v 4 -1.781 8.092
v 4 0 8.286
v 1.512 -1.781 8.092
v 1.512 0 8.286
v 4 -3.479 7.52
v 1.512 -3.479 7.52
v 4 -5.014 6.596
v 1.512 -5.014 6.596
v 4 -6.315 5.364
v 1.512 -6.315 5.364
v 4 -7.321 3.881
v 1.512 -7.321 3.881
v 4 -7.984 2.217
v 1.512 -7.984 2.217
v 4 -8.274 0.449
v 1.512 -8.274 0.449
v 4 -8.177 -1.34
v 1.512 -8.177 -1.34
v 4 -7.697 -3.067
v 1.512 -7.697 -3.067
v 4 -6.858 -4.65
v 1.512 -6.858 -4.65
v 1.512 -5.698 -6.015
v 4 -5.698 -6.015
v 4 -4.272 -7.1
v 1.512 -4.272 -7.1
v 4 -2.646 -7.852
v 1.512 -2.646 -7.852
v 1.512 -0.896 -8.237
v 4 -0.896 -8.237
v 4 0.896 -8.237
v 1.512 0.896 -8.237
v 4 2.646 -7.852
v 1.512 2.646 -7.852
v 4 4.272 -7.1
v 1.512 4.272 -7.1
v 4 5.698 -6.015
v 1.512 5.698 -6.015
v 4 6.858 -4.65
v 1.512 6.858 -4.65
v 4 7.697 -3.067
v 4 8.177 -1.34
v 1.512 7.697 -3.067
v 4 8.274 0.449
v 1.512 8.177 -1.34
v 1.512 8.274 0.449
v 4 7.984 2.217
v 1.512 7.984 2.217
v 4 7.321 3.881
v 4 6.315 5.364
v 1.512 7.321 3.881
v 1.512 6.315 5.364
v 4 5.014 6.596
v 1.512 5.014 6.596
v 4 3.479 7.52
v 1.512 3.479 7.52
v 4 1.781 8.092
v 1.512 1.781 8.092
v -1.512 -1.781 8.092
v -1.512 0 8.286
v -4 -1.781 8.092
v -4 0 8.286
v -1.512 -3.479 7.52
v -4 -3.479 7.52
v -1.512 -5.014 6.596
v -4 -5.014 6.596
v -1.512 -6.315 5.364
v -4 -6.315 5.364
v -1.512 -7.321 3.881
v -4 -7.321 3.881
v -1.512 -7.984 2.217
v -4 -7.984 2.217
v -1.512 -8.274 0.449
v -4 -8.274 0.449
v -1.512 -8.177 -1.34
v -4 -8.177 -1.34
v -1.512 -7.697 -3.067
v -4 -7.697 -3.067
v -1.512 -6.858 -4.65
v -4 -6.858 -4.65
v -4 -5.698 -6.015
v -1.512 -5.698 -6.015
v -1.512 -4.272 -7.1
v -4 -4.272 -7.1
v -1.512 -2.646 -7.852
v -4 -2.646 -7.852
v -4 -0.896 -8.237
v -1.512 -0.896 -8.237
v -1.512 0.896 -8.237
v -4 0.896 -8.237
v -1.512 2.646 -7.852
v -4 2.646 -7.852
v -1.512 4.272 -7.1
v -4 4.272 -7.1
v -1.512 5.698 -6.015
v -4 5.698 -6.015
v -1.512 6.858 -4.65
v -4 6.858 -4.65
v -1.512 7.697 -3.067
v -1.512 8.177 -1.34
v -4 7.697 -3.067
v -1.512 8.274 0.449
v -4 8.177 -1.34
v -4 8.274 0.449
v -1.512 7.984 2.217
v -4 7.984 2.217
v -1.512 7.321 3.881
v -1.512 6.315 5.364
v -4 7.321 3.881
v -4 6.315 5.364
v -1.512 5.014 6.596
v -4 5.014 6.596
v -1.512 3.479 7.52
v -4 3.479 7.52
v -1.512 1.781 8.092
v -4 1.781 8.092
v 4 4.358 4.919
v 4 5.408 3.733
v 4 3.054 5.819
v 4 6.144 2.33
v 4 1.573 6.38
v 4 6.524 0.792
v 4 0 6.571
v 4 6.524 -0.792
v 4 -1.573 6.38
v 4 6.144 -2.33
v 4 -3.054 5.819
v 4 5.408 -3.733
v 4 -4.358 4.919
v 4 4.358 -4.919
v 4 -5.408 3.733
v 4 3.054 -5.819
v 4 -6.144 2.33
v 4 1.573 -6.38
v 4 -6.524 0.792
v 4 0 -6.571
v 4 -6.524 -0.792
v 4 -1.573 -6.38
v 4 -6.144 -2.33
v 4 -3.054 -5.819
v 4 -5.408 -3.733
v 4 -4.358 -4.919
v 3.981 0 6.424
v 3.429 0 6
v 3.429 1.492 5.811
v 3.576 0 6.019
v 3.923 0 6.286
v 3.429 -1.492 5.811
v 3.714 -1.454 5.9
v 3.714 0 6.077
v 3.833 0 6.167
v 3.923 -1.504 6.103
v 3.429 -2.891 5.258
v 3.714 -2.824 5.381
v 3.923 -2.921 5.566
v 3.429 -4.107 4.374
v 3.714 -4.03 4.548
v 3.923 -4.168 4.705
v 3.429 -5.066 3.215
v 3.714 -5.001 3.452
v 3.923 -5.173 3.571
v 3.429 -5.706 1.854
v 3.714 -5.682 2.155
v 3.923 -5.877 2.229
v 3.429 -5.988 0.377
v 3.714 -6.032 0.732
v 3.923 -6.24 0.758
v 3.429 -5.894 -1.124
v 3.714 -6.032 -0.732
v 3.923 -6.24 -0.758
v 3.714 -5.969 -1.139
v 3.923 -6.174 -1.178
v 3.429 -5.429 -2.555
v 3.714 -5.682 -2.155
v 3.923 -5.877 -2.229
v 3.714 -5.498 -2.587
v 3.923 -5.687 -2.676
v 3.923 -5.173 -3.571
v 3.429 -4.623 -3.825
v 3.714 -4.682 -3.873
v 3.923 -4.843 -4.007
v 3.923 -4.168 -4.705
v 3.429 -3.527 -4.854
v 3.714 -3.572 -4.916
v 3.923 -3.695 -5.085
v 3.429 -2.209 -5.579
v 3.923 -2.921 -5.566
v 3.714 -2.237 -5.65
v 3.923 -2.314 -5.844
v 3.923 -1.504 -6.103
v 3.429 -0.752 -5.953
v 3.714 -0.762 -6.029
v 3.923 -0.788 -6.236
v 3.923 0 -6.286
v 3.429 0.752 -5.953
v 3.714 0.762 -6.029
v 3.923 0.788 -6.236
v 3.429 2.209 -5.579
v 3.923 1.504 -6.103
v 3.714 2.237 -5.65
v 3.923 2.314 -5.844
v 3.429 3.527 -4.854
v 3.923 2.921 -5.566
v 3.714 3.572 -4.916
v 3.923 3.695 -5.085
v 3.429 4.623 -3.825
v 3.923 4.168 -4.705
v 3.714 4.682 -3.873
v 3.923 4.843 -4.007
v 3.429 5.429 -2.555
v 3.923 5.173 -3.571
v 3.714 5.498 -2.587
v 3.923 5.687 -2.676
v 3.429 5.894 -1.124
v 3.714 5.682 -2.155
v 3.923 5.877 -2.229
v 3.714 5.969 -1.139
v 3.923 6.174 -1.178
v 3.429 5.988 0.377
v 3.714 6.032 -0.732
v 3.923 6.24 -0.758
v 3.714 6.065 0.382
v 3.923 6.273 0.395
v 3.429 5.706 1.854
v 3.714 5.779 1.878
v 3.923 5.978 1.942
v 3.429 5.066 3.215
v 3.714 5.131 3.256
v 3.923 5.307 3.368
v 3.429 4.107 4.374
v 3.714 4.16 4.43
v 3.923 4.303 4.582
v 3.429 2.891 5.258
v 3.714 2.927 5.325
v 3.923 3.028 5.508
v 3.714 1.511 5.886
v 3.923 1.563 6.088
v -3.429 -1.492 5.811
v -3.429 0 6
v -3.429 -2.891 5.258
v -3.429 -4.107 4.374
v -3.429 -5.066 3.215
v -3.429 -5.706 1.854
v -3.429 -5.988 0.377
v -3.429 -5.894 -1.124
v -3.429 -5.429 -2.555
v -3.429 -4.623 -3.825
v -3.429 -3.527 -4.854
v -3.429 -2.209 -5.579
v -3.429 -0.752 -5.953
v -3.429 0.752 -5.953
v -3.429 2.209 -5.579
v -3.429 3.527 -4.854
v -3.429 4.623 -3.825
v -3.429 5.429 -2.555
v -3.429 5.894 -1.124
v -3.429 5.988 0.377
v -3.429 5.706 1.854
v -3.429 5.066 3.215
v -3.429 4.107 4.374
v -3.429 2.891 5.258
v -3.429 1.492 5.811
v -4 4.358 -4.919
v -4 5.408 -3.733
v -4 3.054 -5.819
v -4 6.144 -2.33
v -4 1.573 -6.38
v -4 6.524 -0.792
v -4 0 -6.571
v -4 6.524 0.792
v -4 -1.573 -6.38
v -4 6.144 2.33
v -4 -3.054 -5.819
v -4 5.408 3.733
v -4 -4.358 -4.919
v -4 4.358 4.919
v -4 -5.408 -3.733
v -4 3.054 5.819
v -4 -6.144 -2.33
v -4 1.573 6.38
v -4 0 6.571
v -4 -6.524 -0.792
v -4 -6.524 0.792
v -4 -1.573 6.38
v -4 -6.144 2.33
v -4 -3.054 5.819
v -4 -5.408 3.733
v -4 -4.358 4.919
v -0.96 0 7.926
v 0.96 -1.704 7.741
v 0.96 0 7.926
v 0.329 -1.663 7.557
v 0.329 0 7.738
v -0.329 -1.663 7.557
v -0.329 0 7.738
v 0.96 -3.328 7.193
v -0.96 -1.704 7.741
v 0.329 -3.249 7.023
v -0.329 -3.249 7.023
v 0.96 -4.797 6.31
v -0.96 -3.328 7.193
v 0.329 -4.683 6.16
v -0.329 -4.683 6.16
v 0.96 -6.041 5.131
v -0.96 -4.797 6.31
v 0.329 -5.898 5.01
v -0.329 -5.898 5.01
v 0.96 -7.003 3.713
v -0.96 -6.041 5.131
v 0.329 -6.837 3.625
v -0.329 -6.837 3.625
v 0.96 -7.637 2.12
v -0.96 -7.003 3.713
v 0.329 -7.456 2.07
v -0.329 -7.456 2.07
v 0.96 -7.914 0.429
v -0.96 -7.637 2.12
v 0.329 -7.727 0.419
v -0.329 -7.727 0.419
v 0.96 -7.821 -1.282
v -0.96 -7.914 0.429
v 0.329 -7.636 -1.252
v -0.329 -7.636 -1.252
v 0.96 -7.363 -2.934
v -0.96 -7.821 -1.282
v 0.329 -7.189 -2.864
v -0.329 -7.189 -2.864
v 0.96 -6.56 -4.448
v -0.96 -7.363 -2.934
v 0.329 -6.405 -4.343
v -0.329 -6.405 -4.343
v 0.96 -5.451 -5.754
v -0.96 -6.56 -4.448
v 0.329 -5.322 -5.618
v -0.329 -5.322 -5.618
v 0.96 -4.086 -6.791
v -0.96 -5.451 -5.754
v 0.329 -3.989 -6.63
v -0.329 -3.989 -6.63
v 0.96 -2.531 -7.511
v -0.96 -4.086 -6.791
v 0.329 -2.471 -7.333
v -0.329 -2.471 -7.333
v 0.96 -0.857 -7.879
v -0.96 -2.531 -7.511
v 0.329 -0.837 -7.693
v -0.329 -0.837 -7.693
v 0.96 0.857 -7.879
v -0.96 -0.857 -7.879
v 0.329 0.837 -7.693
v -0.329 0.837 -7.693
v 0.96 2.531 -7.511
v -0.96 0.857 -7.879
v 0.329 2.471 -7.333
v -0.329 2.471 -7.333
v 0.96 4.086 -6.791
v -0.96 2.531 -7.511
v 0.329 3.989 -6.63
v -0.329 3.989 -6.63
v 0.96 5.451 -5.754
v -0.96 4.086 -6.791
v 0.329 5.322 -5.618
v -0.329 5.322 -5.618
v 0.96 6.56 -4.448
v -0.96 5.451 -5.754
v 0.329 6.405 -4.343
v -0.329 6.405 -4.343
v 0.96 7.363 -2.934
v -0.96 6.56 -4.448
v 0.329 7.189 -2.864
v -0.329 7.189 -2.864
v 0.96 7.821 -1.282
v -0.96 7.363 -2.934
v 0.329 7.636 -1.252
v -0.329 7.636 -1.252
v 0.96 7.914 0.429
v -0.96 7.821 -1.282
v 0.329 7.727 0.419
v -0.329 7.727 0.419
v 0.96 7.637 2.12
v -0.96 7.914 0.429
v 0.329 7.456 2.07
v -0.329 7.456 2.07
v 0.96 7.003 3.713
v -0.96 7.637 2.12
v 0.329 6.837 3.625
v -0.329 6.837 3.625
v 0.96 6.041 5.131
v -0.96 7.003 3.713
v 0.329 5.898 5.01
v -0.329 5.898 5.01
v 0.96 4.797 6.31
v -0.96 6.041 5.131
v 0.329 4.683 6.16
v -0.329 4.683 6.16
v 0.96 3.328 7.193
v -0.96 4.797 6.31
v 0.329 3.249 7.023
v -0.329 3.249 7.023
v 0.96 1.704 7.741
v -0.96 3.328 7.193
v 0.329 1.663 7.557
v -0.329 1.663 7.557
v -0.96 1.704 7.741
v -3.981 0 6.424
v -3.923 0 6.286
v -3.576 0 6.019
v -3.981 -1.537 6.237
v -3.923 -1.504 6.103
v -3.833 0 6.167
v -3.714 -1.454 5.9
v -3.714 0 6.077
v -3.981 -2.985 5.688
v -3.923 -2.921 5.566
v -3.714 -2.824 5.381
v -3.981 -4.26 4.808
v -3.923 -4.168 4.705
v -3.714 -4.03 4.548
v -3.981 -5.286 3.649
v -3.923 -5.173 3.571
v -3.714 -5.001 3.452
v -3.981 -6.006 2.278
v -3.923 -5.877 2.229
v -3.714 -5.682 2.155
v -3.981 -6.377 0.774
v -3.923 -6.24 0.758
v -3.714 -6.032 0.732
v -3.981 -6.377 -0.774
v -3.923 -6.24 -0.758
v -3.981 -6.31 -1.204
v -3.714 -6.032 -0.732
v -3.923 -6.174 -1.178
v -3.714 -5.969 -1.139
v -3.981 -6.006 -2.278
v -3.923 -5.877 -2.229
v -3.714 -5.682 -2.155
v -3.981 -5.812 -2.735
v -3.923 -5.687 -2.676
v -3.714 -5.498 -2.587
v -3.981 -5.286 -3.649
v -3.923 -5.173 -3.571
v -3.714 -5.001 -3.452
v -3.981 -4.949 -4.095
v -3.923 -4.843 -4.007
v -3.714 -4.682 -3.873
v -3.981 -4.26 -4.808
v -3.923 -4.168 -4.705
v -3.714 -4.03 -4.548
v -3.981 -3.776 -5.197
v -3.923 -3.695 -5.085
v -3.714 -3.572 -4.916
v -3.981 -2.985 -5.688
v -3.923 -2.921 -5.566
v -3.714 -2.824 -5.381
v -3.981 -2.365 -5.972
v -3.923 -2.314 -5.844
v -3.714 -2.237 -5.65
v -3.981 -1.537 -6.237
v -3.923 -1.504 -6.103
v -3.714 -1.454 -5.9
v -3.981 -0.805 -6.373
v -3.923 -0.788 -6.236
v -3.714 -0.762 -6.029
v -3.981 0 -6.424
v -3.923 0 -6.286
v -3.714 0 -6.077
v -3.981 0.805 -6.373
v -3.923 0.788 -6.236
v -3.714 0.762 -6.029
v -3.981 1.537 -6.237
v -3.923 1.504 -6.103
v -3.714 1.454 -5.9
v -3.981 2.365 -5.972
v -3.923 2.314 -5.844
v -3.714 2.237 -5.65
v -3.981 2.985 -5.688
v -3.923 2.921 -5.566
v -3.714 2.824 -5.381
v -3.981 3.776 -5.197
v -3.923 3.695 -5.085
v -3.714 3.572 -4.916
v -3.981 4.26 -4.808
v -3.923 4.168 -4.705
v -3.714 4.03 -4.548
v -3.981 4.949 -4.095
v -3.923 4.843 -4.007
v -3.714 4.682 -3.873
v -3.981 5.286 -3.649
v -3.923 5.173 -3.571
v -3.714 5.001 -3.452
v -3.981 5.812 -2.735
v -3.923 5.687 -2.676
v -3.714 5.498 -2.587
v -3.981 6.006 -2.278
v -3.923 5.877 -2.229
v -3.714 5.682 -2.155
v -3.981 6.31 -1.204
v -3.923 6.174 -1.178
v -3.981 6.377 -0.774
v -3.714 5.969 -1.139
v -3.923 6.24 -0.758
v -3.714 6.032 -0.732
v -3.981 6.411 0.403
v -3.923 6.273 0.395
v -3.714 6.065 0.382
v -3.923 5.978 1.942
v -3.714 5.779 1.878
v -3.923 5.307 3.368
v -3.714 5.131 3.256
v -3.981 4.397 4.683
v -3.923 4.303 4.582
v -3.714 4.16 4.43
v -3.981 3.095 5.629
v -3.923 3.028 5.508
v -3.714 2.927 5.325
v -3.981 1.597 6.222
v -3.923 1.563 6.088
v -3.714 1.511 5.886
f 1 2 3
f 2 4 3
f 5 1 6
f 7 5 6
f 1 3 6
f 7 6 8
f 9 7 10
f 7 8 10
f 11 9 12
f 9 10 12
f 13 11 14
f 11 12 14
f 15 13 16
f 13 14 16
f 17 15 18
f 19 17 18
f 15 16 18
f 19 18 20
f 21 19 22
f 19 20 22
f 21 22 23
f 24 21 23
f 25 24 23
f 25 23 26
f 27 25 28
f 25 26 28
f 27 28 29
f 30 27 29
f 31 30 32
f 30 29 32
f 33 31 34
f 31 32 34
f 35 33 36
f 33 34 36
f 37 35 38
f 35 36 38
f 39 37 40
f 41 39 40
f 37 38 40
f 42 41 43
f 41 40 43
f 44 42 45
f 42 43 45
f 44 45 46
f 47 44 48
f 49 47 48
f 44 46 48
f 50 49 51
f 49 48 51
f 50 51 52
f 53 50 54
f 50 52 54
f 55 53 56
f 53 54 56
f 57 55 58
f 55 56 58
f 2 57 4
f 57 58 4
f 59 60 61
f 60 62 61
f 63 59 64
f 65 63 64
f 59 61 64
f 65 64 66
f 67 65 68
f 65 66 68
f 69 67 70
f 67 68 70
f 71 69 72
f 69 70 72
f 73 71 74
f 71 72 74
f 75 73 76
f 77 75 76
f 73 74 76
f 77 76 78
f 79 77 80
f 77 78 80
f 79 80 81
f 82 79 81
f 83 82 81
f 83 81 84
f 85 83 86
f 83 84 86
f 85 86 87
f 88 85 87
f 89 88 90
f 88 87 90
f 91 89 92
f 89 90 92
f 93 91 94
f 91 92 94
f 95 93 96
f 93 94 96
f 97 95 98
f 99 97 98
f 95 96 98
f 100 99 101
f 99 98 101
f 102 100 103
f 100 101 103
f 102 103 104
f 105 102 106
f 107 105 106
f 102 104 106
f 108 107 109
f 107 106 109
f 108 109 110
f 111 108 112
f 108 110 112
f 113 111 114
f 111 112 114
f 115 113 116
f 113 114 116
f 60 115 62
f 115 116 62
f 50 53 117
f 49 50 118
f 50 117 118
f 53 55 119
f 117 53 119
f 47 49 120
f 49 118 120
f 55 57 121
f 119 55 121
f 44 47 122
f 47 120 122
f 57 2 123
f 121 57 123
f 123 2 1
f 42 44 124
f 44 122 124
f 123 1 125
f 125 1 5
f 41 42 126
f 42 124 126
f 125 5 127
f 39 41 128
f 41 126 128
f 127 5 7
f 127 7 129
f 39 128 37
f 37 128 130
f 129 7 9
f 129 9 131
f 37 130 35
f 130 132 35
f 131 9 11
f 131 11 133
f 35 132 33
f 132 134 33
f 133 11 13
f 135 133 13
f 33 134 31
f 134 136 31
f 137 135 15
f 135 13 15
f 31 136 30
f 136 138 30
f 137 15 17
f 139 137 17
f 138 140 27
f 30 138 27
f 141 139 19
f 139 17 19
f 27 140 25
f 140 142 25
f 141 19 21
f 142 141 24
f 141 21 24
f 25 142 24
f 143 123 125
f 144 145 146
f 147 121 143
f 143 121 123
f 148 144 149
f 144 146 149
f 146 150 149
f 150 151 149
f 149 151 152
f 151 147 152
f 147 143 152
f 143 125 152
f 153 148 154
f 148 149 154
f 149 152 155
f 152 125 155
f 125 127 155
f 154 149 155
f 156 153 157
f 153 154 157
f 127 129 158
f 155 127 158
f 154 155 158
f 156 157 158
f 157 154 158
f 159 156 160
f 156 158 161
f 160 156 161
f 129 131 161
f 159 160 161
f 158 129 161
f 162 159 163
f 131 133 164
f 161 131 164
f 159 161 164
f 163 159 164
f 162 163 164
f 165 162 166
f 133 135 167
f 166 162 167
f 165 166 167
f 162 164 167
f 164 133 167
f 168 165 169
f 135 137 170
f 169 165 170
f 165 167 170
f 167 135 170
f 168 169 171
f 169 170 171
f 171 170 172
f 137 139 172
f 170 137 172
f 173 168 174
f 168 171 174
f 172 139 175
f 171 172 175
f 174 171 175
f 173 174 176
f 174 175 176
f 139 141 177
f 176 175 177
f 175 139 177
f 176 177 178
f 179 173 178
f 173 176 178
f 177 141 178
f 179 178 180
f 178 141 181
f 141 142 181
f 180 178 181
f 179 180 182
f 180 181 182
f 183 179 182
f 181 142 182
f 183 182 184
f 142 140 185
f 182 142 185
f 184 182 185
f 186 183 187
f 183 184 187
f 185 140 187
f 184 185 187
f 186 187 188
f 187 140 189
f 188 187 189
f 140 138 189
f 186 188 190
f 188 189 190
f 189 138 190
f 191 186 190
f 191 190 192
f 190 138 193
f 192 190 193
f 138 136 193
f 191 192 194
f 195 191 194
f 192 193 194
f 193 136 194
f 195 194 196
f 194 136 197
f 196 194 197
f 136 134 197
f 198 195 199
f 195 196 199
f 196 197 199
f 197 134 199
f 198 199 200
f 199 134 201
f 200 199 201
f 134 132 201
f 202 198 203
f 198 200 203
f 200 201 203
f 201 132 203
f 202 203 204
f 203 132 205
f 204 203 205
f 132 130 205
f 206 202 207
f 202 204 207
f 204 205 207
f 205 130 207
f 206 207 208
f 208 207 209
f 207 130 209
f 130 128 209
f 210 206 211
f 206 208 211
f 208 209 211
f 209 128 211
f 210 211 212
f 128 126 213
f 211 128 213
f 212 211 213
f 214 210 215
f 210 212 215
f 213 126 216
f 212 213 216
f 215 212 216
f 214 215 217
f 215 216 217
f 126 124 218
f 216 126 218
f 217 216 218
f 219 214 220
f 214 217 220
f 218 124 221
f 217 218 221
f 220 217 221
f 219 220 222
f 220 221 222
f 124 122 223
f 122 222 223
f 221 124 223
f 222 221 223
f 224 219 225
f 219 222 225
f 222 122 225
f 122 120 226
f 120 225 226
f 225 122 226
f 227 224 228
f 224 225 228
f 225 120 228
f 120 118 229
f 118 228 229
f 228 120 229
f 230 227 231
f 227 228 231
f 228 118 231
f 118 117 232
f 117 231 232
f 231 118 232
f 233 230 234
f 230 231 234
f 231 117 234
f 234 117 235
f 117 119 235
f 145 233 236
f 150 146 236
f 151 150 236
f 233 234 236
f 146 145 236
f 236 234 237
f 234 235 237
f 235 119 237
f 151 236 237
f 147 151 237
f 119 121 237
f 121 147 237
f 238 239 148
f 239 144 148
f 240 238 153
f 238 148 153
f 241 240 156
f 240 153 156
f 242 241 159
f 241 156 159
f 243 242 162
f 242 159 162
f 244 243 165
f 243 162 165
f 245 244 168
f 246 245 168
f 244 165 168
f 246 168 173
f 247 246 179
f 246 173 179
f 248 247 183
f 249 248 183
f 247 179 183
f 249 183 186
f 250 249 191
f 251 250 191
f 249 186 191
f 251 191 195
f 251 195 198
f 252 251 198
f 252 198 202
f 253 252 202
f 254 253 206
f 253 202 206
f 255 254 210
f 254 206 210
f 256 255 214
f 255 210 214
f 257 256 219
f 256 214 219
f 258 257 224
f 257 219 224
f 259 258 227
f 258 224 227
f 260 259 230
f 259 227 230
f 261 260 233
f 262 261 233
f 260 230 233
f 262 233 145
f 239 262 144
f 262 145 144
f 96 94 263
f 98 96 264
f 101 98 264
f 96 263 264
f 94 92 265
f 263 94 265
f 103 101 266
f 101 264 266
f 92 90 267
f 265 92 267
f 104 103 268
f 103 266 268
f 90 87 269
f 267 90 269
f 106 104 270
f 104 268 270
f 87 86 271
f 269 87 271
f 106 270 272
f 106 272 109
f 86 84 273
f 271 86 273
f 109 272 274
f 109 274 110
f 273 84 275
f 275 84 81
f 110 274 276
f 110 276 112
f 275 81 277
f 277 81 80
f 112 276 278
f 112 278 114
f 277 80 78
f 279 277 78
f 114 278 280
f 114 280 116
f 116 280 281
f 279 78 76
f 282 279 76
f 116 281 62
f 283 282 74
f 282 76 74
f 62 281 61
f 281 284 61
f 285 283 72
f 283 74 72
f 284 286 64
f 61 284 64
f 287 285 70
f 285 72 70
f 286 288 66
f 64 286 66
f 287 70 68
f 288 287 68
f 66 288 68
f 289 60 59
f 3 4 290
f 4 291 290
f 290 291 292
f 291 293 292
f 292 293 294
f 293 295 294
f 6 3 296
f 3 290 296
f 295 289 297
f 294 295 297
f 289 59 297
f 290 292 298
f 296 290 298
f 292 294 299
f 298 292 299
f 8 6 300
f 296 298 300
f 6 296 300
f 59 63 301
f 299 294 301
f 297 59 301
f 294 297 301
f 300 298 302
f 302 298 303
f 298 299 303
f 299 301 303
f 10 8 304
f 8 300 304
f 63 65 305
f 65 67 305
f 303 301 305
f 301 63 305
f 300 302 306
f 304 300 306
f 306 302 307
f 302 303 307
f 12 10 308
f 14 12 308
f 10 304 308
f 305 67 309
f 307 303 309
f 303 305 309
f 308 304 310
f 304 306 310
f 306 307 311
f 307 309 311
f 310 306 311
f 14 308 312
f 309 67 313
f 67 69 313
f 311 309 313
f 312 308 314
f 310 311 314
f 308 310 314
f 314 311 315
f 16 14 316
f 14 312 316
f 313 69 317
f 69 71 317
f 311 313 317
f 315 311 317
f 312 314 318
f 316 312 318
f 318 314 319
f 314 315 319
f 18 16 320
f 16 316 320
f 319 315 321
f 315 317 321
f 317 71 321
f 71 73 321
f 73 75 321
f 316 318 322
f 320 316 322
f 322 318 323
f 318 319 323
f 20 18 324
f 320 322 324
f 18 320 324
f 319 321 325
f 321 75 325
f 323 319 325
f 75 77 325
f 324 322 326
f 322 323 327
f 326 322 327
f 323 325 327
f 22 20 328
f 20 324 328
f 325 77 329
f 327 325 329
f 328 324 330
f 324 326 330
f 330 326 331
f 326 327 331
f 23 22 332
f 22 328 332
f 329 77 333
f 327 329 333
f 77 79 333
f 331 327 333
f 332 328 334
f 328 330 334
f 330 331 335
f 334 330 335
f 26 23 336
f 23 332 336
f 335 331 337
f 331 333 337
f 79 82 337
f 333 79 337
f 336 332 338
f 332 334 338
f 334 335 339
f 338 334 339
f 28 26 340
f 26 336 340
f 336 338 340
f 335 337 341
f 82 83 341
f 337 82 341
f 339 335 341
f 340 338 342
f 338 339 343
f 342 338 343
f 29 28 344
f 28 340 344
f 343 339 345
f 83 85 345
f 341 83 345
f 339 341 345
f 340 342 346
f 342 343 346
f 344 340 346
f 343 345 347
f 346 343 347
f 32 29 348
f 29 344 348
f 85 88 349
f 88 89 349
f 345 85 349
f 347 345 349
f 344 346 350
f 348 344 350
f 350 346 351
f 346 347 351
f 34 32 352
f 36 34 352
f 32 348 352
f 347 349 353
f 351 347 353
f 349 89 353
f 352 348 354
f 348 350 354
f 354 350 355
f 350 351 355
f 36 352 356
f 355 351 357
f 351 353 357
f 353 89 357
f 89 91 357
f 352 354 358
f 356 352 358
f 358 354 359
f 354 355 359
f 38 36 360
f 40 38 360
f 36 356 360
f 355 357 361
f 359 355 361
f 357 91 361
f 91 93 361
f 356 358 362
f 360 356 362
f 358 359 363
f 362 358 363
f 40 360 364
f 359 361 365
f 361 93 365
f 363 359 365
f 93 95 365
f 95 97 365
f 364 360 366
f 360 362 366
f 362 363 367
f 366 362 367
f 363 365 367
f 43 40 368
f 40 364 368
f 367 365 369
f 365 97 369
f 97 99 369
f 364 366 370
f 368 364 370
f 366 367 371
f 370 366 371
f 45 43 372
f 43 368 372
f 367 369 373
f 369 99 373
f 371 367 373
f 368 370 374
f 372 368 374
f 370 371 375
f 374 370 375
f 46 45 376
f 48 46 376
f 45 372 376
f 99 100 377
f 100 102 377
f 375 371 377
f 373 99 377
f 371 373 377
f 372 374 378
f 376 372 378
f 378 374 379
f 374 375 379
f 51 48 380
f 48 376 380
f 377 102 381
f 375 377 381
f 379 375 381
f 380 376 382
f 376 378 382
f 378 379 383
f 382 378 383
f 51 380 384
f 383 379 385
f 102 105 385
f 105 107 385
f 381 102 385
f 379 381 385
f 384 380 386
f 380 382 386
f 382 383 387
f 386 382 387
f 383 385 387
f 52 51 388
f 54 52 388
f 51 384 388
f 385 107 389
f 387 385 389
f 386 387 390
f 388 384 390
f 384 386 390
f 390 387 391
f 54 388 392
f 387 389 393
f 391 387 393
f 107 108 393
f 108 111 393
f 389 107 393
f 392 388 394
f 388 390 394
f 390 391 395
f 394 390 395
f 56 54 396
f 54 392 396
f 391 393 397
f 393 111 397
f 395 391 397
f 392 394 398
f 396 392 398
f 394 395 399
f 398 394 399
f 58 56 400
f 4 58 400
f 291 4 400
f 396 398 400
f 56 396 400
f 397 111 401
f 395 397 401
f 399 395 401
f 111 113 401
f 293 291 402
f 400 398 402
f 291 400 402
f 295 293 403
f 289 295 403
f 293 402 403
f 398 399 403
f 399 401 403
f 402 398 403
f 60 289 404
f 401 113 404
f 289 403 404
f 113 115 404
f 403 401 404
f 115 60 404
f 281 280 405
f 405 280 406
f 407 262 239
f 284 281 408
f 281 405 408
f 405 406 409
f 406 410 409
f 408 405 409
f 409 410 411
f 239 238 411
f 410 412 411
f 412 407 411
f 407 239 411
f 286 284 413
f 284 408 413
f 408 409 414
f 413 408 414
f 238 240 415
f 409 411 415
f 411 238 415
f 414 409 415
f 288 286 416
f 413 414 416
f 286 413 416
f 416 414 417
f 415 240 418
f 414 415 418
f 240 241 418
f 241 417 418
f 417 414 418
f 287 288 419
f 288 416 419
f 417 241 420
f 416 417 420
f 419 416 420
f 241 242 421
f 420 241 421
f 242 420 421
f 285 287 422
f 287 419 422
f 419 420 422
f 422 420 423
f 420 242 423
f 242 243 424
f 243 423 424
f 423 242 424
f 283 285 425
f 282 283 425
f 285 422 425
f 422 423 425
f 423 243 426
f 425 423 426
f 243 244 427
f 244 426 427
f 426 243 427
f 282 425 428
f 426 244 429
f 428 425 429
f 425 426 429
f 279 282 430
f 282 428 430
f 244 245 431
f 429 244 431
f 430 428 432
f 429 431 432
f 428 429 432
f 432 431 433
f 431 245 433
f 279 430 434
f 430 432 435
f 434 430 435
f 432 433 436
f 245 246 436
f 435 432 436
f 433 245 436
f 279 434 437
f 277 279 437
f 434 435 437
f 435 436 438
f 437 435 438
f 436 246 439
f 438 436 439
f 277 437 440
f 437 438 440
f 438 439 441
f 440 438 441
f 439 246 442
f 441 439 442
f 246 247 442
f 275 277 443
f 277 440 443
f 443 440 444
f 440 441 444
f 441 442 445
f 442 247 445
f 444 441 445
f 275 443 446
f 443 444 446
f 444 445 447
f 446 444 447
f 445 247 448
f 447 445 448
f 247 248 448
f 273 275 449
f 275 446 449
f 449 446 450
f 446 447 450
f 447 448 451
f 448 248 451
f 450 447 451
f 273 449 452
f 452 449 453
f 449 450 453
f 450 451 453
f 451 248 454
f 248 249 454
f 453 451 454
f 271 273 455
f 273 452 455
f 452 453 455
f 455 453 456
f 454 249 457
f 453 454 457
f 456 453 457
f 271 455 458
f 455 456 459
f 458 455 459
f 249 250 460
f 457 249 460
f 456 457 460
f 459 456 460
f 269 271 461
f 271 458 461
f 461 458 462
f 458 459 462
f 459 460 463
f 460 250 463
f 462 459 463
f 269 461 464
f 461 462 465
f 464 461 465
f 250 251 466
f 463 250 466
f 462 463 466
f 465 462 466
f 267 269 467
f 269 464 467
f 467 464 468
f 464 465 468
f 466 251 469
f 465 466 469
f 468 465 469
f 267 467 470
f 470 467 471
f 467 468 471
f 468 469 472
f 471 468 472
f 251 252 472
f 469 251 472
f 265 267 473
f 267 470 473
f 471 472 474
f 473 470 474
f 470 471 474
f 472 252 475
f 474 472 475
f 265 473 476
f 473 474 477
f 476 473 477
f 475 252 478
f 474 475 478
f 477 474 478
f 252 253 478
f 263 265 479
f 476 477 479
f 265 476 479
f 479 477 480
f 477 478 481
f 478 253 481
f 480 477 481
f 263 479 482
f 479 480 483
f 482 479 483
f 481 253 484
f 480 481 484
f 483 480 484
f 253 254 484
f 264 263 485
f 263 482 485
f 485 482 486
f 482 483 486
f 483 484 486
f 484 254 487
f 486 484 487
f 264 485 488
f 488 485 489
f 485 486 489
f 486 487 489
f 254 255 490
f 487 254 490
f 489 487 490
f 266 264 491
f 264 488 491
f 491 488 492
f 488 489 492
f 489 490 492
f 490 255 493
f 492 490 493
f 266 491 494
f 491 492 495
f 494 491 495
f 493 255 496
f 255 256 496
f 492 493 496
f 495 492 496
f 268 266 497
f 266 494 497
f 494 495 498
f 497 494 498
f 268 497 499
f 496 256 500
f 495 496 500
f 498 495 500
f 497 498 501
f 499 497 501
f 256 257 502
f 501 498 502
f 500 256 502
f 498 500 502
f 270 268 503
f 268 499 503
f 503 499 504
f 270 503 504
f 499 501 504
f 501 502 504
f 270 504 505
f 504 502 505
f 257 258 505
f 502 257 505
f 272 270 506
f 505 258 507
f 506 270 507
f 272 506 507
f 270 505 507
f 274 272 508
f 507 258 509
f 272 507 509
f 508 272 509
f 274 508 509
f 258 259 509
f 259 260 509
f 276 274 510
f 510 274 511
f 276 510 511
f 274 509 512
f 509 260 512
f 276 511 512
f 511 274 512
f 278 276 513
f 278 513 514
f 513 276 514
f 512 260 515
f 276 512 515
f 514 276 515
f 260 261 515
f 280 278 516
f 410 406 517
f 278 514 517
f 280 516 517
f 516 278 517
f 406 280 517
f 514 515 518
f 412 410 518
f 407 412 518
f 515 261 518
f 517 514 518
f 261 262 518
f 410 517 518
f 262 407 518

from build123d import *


with BuildPart() as part:
    # Esquisse1 → Base-Révolution (revolve)
    with BuildSketch(Plane.XY):
        with BuildLine():
            Line((-3.428571429, 6), (3.428571429, 6))
            ThreePointArc((3.428571429, 6), (3.832632446, 6.167367554), (4, 6.571428571))
            Line((4, 6.571428571), (4, 8.285714286))
            Line((4, 8.285714286), (1.511857892, 8.285714286))
            ThreePointArc((1.511857892, 8.285714286), (0, 7.714285714), (-1.511857892, 8.285714286))
            Line((-1.511857892, 8.285714286), (-4, 8.285714286))
            Line((-4, 8.285714286), (-4, 6.571428571))
            ThreePointArc((-4, 6.571428571), (-3.832632446, 6.167367554), (-3.428571429, 6))
        make_face()
    revolve(axis=Axis((0, 0, 0), (1, 0, 0)))


solid = part.part
